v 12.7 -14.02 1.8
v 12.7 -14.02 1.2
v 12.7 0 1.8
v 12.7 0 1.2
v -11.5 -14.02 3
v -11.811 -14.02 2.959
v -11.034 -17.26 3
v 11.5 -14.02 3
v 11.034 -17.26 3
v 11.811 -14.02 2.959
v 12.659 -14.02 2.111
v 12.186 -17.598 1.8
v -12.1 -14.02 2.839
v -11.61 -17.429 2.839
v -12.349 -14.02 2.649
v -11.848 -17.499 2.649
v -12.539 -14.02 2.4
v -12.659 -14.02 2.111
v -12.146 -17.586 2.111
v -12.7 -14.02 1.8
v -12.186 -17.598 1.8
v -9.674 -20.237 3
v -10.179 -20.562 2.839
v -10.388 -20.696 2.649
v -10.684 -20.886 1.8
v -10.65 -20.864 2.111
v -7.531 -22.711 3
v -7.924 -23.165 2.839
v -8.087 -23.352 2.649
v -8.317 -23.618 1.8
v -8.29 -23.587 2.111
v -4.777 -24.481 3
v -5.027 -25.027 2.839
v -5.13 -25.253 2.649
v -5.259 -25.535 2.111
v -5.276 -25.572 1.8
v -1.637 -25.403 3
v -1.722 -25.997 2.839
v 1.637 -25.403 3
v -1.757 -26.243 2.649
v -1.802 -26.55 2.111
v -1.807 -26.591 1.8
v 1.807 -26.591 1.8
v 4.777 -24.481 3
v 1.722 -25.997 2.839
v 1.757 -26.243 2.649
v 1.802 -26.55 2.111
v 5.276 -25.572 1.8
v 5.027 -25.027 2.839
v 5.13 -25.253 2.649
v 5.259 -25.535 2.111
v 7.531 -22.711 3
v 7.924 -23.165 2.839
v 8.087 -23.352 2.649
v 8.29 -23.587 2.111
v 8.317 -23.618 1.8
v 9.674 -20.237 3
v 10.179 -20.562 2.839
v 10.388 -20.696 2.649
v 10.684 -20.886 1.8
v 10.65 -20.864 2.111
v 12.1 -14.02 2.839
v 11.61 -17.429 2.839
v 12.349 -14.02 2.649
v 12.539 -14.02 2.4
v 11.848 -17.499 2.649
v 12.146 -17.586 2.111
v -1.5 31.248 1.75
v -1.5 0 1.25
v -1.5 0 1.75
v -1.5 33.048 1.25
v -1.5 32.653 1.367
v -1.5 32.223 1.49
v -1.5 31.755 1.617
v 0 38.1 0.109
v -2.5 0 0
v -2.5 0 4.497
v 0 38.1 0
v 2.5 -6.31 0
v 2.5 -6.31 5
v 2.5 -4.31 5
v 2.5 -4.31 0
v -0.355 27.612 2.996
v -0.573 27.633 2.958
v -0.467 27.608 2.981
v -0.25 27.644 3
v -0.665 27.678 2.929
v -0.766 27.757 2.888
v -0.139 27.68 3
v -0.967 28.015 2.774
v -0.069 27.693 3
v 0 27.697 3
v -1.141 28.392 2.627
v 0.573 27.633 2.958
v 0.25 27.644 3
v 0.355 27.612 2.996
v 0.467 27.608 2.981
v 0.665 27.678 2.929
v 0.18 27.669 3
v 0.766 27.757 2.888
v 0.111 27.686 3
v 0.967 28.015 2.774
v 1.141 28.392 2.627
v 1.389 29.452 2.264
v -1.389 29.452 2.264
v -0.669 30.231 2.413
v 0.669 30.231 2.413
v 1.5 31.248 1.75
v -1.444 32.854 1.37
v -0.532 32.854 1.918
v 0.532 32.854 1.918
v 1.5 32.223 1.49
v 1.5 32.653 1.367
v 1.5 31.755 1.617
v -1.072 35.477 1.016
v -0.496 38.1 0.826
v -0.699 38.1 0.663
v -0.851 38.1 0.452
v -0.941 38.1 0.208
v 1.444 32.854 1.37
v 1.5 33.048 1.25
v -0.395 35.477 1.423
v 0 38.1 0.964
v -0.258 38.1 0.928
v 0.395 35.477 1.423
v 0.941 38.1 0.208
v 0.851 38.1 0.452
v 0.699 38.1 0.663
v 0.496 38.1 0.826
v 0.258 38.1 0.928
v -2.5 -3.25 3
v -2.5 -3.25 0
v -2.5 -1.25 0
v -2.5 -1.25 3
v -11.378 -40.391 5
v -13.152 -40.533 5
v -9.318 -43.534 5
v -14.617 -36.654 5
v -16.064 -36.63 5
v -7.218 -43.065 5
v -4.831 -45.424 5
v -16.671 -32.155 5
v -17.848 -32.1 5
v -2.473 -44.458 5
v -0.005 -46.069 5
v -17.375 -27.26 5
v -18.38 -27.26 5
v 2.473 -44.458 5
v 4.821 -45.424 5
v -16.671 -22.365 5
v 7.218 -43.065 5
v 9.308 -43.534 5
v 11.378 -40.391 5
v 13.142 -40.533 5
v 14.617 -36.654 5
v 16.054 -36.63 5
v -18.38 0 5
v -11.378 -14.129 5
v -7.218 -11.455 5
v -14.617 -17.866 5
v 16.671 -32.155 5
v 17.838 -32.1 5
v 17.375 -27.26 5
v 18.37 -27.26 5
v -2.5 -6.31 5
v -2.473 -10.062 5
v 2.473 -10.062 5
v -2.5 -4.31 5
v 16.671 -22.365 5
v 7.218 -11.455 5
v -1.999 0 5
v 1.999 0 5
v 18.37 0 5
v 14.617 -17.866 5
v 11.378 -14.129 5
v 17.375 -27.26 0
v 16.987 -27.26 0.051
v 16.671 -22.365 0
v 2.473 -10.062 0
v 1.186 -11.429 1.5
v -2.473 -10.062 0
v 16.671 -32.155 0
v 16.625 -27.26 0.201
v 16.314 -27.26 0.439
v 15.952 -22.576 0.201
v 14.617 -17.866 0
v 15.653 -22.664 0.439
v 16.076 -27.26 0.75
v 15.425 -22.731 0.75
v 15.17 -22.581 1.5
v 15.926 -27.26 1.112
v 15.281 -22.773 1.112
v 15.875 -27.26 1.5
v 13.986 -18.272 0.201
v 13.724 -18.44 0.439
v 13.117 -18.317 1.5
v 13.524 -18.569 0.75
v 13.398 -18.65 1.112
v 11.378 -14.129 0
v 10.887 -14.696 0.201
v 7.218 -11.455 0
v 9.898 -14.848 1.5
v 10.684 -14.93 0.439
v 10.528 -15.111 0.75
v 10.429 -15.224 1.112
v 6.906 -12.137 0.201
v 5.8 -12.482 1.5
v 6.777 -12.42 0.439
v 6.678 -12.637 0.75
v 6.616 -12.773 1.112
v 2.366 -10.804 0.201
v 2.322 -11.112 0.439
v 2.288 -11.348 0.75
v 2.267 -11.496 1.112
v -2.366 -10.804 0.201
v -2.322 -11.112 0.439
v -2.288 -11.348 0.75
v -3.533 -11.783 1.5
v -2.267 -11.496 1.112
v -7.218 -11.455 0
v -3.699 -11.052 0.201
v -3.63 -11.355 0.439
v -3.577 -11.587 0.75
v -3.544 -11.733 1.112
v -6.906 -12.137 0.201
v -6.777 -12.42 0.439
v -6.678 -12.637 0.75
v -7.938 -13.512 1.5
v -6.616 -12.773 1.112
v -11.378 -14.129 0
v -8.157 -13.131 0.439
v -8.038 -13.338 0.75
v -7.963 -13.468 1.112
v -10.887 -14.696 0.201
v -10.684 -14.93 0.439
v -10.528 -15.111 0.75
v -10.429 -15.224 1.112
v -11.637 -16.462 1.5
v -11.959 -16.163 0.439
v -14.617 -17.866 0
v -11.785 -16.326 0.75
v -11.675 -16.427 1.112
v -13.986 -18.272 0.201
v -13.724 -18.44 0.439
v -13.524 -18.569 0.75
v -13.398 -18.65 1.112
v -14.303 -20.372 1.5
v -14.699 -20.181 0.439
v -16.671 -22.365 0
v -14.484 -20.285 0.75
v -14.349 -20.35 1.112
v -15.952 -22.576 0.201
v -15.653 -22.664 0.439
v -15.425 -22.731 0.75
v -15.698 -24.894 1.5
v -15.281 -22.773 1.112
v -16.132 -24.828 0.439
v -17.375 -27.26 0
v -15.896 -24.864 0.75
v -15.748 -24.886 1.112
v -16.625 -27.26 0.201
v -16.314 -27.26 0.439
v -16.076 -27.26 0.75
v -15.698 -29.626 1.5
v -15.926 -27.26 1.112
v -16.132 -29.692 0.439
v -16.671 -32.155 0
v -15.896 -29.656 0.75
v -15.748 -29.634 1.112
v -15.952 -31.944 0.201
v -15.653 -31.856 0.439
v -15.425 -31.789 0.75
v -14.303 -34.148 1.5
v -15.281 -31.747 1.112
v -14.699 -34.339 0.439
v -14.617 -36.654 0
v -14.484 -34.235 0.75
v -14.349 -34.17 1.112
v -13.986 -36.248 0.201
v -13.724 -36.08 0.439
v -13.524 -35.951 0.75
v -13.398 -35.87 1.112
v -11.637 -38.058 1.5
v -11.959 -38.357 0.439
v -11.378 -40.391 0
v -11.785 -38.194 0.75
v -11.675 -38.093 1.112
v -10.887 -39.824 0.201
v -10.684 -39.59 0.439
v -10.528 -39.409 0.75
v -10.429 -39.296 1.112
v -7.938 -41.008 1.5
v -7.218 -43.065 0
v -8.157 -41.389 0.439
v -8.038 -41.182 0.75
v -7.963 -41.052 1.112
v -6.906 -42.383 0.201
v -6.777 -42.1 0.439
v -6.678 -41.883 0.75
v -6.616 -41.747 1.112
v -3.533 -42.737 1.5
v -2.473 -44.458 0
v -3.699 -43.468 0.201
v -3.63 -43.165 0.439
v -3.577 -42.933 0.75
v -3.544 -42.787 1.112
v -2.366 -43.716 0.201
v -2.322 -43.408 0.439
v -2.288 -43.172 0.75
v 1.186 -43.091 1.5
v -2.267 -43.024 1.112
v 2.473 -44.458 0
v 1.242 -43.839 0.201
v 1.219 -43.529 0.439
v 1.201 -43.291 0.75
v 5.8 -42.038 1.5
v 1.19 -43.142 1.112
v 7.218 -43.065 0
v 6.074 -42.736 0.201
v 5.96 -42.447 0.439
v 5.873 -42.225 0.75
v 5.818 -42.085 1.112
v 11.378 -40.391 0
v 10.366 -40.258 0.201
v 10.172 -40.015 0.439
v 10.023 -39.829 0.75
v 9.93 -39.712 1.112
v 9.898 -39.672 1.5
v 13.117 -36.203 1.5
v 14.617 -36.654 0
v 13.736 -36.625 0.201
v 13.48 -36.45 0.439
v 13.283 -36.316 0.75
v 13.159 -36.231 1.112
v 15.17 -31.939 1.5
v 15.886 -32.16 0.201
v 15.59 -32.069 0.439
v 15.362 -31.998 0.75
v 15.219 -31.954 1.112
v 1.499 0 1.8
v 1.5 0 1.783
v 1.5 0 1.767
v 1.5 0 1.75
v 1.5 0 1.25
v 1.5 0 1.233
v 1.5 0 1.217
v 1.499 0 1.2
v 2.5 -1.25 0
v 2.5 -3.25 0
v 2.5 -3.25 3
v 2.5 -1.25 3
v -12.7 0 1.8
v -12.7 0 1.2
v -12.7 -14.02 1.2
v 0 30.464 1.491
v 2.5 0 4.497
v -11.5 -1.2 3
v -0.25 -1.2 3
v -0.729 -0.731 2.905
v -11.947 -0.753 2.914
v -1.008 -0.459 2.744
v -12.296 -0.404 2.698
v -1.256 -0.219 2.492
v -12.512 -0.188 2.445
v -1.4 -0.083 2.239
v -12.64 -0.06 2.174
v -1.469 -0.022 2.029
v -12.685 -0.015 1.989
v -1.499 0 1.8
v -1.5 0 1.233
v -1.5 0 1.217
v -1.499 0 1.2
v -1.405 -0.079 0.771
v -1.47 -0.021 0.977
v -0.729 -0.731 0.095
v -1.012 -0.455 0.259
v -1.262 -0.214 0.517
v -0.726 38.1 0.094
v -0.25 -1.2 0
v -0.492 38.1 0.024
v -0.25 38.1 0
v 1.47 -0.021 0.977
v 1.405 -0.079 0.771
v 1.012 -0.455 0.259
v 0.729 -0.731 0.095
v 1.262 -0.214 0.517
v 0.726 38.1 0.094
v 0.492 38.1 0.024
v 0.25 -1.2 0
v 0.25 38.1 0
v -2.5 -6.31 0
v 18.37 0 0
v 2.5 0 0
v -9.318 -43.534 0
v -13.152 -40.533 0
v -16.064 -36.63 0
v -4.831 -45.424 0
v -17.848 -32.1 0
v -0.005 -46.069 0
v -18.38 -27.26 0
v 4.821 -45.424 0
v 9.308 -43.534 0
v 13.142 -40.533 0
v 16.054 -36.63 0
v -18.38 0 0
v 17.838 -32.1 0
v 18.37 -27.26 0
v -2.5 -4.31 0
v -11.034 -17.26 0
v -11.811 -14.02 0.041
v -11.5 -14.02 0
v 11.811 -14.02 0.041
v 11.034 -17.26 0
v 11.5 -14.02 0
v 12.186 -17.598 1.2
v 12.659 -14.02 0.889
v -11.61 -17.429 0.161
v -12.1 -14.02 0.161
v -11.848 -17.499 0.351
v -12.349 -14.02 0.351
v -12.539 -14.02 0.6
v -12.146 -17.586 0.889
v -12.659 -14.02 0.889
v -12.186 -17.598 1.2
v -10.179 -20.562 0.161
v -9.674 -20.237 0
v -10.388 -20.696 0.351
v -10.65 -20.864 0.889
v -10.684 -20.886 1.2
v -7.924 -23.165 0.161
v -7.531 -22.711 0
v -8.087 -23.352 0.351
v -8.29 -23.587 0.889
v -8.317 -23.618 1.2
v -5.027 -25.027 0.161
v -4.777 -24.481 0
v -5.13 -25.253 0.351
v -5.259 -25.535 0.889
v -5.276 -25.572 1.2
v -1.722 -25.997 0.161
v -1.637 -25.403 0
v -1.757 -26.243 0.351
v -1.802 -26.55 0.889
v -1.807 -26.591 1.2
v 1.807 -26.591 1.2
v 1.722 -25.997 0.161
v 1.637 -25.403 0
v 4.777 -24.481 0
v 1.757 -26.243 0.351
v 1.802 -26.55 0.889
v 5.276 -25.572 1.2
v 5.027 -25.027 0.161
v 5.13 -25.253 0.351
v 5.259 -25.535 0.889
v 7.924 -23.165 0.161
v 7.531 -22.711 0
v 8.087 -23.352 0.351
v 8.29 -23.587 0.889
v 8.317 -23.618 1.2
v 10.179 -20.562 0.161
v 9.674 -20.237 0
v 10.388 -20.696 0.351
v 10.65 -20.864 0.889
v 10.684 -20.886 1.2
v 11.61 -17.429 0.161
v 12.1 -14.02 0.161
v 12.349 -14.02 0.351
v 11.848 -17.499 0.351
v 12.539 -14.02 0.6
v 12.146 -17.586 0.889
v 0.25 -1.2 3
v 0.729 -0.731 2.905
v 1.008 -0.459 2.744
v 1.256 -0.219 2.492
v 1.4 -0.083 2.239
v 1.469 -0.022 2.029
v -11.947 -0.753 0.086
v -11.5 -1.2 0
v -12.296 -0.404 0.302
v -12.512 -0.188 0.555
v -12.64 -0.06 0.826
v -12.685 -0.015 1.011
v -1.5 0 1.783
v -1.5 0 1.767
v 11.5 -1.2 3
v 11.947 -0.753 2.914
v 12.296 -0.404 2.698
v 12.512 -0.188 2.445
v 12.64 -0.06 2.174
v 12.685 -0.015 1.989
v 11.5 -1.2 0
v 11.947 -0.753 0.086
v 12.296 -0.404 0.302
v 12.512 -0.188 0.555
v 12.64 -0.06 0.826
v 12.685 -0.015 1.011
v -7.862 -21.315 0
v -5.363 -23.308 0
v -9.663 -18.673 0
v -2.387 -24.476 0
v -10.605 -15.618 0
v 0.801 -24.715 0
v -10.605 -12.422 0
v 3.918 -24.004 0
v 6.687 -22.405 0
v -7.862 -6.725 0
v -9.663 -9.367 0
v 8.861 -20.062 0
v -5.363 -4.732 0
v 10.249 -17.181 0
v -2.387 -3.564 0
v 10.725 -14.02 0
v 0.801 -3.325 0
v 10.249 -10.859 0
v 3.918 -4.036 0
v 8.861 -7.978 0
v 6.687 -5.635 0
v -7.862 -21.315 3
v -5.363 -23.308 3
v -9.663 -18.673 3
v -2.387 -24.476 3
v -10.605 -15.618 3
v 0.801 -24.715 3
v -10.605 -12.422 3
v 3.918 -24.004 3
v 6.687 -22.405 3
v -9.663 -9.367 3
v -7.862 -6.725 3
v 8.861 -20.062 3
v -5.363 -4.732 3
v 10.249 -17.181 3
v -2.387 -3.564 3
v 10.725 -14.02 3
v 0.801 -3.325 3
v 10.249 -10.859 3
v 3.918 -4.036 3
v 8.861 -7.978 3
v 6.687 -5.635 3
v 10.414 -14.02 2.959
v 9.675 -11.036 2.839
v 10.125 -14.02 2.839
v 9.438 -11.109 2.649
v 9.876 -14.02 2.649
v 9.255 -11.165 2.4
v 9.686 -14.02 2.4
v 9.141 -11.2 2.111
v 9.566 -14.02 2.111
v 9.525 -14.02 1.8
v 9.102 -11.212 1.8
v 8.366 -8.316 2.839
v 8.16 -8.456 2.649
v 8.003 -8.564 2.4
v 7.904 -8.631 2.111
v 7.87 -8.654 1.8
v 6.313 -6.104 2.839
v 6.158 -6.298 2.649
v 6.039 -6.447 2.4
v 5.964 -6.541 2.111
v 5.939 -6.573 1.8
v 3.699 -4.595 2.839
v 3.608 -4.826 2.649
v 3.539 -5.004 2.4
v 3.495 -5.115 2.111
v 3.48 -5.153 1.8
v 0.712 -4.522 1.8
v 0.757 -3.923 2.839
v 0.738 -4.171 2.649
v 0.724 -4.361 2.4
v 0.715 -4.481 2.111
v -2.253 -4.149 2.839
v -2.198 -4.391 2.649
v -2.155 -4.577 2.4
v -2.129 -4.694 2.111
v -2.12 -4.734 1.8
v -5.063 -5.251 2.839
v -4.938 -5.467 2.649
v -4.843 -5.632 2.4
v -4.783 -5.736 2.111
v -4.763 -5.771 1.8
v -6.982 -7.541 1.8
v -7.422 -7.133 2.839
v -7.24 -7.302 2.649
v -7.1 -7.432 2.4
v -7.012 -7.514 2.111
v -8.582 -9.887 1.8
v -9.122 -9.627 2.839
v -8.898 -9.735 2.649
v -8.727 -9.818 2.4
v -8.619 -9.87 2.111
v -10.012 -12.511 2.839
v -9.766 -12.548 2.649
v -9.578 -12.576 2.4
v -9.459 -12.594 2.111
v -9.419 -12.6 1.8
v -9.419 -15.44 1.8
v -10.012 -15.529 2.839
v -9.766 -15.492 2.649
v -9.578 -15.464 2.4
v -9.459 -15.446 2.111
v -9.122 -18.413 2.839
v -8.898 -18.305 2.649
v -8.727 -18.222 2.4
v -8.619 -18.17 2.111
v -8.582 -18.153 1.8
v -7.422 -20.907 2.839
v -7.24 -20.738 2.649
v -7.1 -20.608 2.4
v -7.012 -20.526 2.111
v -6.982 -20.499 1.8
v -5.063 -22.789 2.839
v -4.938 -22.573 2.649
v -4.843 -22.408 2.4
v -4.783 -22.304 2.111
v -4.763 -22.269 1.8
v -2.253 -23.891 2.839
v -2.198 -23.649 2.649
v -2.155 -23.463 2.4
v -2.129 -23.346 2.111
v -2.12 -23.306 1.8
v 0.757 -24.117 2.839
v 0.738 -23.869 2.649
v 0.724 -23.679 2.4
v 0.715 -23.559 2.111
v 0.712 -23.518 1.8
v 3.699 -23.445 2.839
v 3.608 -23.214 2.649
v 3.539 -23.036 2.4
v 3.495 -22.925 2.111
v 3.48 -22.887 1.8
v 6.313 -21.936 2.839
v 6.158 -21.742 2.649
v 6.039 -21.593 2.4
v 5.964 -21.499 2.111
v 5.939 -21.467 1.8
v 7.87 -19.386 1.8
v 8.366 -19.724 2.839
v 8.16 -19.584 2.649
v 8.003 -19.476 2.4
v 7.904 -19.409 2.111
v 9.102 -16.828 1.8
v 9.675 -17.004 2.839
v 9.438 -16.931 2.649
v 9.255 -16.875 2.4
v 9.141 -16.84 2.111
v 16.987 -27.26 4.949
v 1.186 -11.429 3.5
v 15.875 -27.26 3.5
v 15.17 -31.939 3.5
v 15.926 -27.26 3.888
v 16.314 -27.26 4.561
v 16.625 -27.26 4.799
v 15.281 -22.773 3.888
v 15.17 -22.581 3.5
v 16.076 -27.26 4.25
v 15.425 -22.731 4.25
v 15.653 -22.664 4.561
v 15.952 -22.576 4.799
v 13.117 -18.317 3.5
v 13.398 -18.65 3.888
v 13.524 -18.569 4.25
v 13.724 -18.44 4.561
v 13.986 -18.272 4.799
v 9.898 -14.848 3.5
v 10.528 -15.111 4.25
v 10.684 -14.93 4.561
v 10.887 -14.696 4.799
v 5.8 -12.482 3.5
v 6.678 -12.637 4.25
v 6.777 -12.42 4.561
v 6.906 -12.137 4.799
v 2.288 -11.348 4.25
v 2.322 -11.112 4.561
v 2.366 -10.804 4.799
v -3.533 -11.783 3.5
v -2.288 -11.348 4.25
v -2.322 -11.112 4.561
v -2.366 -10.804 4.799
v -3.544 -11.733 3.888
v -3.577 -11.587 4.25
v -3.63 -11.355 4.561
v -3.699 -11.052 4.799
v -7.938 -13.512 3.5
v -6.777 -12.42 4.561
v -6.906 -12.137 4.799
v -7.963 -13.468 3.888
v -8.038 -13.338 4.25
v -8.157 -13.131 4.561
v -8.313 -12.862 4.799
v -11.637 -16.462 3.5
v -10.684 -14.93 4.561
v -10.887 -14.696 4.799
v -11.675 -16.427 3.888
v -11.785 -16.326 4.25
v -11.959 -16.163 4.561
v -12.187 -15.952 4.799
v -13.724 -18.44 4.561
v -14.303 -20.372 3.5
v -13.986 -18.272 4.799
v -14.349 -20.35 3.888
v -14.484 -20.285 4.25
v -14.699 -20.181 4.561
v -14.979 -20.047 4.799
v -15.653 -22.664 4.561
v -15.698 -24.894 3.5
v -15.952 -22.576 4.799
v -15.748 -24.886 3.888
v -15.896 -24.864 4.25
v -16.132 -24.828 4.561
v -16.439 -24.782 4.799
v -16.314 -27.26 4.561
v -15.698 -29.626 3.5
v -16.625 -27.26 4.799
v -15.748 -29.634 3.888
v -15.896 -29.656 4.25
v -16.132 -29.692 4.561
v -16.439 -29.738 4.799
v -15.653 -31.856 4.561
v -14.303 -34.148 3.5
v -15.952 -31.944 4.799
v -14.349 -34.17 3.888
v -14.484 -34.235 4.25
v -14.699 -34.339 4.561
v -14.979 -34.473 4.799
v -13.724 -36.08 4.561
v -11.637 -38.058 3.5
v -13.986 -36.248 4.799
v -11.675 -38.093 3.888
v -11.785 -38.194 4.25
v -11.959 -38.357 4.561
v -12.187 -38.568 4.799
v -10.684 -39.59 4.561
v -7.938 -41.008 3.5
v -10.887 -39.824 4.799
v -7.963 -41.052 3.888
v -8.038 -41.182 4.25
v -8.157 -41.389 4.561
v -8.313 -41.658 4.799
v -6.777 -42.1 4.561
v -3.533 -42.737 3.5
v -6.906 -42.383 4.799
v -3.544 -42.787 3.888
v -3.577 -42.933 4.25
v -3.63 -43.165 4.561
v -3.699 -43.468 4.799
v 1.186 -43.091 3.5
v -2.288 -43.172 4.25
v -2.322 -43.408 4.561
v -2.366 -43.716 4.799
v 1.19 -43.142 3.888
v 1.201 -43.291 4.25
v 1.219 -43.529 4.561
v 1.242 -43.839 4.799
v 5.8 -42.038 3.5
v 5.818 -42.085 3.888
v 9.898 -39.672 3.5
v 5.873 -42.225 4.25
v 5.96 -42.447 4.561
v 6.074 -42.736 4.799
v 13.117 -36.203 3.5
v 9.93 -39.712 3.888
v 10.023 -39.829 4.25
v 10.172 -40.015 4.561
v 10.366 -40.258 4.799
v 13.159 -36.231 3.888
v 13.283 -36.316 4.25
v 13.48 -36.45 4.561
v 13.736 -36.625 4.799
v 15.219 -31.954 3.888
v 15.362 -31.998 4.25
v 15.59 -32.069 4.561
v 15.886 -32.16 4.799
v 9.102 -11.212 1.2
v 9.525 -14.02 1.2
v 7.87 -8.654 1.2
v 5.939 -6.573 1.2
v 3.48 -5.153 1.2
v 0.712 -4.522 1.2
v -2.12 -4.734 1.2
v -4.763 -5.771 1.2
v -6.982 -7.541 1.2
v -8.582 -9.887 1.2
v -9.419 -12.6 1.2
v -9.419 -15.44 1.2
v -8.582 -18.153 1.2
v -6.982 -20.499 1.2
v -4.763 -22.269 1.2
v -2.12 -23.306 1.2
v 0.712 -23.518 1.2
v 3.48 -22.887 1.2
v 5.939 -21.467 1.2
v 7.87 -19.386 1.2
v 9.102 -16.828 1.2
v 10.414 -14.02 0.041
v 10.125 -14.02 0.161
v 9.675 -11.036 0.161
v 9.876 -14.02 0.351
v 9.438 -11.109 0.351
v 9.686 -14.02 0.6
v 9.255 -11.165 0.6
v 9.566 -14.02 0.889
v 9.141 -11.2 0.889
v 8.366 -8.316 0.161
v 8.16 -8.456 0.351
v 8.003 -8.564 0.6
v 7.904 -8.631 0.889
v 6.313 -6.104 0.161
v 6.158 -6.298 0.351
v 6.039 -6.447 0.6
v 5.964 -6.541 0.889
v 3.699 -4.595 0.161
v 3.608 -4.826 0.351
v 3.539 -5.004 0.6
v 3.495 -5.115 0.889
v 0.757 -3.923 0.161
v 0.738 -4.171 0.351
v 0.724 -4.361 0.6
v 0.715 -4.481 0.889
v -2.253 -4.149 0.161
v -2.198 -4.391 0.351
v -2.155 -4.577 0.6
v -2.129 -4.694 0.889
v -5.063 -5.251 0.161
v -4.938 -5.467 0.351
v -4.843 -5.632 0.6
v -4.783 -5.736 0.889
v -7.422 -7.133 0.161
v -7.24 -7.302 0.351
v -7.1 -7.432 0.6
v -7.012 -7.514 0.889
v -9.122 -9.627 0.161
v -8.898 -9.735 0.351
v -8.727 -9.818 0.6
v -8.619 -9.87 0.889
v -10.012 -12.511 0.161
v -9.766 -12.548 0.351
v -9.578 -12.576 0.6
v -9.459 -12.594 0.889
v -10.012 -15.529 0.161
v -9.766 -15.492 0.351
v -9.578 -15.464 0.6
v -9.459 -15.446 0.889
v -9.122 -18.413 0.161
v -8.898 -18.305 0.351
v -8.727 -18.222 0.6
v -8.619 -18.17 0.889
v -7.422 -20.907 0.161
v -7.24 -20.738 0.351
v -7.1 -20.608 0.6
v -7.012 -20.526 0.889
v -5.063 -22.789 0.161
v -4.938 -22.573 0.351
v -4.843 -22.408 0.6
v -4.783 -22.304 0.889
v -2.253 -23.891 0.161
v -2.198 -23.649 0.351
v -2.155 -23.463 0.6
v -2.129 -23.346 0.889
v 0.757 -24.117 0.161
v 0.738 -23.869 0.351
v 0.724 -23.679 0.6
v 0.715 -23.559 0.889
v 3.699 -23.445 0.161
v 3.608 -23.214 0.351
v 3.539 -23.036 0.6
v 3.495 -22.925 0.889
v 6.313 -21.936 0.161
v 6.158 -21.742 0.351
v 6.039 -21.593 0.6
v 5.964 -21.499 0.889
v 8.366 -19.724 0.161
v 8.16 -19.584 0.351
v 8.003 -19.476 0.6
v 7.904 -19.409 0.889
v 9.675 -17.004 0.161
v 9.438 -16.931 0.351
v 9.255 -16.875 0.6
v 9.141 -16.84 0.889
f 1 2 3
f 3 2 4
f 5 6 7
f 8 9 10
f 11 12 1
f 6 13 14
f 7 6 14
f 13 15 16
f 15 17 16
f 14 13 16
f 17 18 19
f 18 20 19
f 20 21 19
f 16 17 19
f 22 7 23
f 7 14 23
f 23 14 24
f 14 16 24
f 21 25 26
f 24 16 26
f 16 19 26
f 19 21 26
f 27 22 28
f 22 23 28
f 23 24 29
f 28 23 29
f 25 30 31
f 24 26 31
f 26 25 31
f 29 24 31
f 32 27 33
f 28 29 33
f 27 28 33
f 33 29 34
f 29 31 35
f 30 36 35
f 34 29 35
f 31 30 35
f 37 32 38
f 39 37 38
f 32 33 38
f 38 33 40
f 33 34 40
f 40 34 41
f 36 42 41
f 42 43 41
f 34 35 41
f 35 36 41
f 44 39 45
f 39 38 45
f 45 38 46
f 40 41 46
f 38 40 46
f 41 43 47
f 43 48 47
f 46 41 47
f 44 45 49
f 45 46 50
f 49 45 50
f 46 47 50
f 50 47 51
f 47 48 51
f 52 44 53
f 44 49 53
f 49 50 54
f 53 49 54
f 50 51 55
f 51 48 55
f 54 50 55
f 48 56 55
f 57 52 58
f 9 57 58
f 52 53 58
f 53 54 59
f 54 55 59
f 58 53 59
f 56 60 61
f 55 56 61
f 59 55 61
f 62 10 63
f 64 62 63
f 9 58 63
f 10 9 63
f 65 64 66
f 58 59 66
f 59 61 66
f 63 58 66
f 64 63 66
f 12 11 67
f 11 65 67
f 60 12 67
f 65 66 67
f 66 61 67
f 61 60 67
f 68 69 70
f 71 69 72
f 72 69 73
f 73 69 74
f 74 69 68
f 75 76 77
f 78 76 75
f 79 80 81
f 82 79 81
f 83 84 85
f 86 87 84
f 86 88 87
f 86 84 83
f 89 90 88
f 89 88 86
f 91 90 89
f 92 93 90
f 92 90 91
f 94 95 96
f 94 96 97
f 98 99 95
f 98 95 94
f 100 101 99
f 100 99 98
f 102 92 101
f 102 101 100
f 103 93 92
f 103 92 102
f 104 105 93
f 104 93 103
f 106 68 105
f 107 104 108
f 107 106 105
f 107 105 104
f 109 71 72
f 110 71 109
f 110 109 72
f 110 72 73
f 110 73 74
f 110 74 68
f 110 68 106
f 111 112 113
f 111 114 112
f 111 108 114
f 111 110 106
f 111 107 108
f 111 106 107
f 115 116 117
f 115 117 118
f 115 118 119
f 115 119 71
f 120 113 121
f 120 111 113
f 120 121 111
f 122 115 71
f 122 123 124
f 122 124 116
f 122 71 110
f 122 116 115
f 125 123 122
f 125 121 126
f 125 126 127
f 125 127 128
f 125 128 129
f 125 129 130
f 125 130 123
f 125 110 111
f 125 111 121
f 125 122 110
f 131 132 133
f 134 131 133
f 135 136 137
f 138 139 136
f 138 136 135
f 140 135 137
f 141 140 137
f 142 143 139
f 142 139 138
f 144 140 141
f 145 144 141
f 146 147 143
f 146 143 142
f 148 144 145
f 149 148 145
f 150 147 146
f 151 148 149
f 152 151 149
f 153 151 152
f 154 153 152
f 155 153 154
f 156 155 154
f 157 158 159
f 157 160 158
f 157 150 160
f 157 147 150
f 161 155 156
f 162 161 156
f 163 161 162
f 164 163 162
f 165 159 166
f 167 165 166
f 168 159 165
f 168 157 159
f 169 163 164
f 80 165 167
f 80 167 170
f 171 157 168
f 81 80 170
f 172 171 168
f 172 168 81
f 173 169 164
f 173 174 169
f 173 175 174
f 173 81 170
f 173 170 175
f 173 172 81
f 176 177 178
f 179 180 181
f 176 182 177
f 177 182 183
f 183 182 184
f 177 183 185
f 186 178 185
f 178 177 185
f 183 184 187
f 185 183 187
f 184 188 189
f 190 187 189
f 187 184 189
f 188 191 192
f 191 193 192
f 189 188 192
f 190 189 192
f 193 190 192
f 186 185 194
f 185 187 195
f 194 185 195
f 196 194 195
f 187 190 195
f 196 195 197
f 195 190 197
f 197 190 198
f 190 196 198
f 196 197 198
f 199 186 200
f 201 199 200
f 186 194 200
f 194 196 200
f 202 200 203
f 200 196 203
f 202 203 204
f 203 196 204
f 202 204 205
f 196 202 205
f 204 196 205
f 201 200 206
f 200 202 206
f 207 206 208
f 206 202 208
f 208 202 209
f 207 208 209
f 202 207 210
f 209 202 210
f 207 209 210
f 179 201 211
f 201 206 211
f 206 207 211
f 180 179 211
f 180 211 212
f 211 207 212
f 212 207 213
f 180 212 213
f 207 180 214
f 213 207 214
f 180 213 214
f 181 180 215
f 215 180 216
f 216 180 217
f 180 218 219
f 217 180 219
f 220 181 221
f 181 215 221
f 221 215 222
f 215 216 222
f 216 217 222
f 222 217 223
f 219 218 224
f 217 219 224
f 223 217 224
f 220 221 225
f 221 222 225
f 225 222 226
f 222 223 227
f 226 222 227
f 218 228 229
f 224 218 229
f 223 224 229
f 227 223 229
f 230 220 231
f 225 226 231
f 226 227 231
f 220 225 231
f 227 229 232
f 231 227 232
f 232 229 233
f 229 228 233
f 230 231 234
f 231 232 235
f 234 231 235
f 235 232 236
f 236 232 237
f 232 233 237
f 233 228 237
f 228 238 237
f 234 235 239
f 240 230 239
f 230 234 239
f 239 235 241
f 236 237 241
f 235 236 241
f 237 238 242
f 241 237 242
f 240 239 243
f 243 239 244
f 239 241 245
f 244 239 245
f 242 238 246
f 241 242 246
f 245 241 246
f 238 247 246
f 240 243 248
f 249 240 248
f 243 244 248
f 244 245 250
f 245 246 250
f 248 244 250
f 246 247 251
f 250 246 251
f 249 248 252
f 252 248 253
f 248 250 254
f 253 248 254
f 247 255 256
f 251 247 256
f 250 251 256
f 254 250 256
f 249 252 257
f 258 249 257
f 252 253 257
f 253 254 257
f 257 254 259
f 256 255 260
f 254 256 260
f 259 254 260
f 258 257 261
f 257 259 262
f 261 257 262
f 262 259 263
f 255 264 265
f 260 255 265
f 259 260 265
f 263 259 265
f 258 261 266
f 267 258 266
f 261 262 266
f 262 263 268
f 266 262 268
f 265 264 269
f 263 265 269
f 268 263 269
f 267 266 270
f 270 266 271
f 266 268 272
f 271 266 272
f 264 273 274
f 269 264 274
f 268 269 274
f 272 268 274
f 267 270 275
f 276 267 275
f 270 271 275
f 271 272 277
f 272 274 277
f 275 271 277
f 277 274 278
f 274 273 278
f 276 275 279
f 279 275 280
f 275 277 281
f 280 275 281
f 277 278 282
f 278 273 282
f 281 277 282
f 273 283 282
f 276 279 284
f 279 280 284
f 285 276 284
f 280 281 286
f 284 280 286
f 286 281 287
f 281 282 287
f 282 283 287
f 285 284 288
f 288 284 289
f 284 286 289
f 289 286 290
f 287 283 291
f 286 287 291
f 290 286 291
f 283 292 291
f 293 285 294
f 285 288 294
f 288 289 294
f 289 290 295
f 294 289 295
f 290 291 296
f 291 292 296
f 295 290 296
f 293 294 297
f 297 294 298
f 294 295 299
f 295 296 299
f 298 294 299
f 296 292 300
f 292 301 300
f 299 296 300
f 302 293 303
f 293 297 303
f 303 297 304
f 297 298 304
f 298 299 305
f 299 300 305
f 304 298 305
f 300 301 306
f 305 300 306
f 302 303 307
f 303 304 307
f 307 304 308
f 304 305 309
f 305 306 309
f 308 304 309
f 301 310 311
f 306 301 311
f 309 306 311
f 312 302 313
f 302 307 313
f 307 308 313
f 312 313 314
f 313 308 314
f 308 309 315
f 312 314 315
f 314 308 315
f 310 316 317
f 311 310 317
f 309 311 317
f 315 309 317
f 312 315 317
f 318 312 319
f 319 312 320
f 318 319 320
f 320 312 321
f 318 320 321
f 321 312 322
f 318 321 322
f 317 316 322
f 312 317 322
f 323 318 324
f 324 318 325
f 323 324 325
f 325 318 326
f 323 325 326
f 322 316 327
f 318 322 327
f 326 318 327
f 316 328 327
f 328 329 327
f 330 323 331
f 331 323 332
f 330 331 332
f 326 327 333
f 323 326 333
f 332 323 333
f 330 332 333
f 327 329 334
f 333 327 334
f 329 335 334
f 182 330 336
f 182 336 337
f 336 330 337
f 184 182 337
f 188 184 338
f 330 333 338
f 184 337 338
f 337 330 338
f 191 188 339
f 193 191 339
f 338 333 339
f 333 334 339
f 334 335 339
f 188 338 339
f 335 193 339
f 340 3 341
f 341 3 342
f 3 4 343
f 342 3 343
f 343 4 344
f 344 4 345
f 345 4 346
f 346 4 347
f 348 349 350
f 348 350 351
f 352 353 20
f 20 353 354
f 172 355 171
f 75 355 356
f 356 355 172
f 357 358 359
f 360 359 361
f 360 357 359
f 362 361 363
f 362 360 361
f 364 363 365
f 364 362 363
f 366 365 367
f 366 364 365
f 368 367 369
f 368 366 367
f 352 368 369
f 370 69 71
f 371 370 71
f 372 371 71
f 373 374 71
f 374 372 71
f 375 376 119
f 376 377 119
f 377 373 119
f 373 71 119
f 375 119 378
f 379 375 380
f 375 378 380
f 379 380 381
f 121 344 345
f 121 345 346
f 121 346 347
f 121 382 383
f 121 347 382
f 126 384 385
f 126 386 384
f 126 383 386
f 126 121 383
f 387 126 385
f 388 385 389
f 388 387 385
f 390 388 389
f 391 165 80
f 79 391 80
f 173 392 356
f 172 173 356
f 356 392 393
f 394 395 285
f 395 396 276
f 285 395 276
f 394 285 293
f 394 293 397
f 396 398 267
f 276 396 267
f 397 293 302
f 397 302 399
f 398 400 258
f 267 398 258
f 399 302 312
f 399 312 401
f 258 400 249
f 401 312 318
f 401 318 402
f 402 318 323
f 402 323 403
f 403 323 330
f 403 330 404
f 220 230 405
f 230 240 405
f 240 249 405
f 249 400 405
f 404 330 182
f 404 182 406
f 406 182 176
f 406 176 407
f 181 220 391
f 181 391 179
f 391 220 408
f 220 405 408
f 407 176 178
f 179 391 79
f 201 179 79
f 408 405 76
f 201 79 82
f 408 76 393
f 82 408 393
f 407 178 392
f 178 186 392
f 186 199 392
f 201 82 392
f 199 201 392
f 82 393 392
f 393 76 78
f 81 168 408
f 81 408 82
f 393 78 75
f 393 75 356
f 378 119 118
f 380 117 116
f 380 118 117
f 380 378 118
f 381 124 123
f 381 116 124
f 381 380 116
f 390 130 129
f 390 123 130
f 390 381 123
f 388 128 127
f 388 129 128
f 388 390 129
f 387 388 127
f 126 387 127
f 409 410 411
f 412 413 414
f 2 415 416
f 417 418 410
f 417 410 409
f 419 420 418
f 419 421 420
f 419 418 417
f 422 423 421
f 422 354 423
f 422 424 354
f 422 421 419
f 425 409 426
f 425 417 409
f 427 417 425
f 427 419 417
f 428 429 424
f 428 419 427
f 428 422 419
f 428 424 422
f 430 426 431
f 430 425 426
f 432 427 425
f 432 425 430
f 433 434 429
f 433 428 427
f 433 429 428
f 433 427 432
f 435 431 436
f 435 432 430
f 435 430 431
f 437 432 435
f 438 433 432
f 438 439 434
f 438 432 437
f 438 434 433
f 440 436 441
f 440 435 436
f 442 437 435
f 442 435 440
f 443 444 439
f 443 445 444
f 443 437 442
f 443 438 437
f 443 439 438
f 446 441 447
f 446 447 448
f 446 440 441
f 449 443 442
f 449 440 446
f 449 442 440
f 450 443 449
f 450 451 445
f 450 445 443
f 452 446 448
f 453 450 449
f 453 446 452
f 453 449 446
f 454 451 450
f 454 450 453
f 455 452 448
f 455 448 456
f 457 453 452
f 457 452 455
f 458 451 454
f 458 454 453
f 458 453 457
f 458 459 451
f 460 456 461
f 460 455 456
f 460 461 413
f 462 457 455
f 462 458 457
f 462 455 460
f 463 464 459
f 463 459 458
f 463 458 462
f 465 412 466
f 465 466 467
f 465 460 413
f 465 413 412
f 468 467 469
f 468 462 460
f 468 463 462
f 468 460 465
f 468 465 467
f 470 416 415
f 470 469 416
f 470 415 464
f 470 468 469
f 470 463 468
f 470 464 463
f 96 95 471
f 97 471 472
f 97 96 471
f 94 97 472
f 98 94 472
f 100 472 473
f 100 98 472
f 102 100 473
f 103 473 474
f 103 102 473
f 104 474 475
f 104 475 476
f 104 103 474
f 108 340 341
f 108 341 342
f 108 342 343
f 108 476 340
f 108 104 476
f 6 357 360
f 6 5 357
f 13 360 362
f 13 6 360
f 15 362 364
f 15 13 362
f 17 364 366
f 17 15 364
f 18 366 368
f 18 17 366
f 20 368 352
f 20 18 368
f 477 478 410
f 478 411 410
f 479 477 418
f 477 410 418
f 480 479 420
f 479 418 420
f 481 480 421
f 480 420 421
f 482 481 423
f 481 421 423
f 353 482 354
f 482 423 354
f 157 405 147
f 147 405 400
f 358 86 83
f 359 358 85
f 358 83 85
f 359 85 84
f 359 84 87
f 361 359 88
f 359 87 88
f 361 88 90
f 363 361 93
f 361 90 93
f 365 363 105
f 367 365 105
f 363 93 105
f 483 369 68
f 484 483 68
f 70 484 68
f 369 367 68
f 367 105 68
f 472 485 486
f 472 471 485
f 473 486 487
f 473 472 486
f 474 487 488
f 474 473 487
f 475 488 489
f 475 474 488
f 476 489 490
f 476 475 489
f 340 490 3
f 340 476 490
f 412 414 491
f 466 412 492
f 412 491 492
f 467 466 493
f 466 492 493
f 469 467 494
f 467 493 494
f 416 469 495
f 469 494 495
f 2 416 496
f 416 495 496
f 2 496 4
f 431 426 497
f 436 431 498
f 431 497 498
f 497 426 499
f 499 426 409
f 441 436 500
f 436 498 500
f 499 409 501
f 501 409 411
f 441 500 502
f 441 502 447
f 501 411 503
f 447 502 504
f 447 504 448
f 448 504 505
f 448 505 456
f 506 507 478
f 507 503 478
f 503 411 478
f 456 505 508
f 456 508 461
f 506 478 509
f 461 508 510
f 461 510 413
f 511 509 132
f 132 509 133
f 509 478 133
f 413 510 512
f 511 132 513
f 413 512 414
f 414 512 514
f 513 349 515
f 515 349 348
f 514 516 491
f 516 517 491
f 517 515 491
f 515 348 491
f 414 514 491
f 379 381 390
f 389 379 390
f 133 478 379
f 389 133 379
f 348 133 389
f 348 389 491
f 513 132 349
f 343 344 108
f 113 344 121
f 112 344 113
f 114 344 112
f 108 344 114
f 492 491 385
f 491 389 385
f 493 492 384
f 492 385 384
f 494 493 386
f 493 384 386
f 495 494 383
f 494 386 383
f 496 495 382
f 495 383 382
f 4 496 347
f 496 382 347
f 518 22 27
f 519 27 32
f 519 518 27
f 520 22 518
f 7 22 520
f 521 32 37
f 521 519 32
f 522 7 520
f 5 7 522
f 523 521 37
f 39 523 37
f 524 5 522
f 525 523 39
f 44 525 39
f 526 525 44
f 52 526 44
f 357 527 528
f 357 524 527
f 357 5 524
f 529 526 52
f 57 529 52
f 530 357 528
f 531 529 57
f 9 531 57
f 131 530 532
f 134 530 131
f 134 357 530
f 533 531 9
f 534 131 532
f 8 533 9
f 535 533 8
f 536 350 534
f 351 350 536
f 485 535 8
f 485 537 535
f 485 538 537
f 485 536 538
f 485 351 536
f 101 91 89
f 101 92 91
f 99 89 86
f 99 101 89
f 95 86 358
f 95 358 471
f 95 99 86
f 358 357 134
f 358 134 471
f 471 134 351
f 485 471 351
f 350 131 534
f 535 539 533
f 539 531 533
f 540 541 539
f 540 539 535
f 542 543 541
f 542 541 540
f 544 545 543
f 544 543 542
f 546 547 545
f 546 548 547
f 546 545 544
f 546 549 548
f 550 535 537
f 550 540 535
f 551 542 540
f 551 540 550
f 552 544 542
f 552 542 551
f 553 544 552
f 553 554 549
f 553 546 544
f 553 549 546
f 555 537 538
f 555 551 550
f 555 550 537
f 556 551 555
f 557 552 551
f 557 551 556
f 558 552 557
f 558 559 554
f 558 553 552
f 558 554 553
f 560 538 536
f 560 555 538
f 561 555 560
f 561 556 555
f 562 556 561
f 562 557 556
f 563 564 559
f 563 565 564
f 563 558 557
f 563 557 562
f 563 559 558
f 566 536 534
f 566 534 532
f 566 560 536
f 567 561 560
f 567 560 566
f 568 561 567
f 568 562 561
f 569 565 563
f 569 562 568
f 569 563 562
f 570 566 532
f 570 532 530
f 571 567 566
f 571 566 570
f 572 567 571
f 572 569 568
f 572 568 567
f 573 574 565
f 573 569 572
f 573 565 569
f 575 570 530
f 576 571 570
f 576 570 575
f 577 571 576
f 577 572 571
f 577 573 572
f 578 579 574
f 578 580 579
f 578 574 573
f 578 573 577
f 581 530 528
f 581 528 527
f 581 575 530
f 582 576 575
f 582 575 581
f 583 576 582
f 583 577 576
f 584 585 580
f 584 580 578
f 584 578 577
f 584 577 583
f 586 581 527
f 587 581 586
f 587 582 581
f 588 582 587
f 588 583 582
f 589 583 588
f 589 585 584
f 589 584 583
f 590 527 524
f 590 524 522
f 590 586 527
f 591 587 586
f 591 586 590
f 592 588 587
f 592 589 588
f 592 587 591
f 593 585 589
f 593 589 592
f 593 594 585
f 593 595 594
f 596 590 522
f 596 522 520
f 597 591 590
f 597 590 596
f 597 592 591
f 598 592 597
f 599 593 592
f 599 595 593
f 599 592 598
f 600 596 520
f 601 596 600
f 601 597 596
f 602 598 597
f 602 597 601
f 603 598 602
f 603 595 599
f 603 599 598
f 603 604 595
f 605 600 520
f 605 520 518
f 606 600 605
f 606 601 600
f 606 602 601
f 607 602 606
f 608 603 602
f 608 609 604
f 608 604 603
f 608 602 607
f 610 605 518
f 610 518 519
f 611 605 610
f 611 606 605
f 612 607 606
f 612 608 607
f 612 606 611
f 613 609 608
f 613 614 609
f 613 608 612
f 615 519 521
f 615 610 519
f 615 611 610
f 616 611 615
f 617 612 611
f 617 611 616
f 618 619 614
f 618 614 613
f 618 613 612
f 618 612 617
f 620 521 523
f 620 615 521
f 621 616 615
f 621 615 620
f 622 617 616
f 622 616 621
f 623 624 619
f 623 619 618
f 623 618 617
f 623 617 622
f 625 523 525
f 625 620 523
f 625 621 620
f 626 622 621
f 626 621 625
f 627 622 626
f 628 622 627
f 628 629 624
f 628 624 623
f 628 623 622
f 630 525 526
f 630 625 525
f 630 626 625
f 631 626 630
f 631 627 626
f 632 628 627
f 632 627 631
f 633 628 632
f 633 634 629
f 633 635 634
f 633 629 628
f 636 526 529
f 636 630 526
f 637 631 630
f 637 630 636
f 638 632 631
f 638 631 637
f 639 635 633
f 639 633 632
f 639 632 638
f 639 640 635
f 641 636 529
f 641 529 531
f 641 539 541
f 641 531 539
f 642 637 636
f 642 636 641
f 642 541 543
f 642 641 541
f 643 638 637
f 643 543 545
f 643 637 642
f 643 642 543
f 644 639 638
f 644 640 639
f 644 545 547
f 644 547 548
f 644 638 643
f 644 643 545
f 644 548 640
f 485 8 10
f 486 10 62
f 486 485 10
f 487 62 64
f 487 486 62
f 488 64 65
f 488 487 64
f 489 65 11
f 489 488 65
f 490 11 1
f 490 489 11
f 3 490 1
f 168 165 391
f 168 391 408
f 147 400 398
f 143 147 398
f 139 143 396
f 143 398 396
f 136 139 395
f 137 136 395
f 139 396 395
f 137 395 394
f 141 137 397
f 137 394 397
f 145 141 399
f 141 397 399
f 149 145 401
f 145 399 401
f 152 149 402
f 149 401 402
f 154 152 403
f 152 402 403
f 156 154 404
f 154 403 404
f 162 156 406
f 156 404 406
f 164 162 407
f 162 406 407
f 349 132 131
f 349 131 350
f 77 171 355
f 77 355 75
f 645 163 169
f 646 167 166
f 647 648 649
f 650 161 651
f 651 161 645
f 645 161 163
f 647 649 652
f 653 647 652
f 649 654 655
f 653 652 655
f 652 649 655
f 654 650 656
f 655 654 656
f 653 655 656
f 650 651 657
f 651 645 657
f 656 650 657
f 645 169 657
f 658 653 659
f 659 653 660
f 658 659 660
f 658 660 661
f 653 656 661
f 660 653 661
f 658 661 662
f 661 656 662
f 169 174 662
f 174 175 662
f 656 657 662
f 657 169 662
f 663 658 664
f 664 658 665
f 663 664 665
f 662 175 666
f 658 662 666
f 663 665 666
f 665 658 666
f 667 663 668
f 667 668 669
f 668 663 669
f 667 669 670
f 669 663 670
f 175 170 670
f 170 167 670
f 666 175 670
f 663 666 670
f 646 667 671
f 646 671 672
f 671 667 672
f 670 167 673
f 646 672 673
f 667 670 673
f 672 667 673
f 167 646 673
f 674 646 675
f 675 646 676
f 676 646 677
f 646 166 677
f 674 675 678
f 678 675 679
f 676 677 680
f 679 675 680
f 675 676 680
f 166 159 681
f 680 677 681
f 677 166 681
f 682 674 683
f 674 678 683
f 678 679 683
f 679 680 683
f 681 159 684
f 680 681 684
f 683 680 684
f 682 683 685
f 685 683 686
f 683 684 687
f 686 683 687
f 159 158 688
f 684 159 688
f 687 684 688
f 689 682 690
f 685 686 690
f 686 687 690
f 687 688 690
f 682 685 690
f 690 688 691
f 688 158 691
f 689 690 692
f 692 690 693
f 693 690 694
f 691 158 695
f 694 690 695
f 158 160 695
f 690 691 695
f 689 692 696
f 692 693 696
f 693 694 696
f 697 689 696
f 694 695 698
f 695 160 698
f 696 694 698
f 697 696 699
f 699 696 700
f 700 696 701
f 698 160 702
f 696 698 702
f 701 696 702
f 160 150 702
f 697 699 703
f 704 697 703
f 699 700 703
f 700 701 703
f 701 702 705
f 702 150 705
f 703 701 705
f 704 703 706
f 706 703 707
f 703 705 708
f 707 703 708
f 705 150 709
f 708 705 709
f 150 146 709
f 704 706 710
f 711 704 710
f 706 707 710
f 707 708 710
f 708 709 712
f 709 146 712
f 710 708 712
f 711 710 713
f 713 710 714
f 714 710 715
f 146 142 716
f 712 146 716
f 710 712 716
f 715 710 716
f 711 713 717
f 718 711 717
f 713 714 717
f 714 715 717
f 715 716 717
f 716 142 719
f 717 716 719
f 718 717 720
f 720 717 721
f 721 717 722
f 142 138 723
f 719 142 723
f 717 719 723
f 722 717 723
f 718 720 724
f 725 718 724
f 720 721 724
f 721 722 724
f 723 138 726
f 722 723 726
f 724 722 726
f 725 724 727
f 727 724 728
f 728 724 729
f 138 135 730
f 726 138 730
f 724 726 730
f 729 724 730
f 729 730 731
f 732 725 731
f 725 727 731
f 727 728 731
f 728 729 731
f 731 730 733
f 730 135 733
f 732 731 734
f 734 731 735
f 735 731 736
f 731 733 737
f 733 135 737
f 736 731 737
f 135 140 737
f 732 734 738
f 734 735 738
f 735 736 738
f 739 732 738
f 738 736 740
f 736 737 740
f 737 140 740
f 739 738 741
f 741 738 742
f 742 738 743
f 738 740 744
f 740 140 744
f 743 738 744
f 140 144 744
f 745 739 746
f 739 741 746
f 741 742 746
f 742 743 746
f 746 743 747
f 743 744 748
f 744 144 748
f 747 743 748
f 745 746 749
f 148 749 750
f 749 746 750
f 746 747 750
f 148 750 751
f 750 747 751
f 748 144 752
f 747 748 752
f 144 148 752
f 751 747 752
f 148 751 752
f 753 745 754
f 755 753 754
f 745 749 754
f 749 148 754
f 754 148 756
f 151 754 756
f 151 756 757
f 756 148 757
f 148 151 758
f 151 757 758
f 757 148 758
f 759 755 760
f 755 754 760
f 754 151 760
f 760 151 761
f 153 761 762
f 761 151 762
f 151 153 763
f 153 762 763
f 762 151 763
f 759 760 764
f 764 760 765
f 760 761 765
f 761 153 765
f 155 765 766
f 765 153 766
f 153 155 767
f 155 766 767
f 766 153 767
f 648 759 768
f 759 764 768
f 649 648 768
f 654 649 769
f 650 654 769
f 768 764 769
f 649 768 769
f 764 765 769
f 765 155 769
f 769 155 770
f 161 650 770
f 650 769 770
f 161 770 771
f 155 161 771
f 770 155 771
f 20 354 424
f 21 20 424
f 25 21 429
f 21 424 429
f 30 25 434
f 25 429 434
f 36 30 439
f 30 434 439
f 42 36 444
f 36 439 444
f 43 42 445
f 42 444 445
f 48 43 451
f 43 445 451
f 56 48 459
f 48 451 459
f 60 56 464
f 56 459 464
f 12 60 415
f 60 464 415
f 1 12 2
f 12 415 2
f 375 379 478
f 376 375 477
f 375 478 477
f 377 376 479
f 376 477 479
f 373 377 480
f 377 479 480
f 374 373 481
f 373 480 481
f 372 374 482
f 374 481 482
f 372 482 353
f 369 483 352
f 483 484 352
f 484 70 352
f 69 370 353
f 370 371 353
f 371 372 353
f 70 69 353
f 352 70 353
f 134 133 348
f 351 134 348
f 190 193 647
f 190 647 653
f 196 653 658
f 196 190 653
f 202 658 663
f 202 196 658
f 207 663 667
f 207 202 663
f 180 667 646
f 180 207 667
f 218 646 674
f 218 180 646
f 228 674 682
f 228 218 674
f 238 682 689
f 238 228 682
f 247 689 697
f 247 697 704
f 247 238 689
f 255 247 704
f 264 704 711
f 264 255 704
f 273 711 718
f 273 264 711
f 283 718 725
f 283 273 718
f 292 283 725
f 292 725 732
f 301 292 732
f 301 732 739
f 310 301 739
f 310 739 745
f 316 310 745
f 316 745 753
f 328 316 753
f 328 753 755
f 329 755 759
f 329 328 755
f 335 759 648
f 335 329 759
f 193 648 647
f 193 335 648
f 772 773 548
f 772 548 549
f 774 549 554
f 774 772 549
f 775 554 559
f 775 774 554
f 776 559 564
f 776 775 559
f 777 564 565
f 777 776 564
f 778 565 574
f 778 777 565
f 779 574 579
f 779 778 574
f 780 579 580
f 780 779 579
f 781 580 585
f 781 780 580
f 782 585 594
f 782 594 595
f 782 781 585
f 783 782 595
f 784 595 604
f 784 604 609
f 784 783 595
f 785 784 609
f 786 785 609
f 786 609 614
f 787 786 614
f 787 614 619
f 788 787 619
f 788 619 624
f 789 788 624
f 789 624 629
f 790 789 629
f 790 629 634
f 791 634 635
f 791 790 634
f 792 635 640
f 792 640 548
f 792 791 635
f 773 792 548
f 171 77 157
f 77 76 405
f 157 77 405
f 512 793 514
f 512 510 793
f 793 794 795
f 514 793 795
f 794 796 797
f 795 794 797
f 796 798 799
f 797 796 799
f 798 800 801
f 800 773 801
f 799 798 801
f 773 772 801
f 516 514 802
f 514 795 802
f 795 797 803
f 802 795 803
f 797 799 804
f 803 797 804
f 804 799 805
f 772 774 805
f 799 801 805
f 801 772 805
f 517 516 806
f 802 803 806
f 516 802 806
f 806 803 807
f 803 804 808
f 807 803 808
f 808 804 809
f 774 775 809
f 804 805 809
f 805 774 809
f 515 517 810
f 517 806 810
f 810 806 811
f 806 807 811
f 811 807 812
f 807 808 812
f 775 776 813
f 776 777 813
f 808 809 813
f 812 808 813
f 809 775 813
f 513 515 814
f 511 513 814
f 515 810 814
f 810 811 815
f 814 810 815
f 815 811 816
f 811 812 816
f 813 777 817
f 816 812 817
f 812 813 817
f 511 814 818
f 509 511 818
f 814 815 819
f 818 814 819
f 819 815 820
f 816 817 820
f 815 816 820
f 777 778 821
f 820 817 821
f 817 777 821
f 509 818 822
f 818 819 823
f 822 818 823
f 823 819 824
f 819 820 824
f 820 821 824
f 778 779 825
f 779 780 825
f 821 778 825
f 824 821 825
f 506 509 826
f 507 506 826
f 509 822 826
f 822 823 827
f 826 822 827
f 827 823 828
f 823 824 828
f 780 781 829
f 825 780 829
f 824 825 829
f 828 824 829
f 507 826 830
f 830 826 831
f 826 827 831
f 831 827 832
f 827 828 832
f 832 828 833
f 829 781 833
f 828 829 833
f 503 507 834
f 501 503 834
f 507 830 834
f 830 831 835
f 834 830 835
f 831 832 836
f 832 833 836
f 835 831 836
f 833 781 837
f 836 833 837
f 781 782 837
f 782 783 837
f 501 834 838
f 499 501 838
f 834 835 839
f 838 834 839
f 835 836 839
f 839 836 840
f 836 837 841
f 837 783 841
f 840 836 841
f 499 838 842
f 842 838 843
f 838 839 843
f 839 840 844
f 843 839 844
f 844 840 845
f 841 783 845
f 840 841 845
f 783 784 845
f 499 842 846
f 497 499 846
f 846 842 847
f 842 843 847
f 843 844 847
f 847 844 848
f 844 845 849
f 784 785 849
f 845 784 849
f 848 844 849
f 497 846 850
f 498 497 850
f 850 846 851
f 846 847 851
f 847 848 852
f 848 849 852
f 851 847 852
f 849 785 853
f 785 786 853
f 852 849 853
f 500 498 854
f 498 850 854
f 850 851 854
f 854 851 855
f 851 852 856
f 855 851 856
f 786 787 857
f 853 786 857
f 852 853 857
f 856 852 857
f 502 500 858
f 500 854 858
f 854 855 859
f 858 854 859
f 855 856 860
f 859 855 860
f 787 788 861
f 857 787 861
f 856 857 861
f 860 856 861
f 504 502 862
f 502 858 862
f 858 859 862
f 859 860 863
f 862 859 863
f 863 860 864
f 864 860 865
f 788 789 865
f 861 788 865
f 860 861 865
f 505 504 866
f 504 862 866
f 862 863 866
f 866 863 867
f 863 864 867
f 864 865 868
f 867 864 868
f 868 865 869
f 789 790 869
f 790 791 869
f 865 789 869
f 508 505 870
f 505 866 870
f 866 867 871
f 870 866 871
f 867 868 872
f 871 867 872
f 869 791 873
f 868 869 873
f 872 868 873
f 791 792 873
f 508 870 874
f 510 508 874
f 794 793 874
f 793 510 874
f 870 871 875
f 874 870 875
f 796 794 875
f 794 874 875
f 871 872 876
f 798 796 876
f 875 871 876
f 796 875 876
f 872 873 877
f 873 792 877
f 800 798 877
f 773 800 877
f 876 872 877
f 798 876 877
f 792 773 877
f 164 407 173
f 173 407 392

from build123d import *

# Parameters (mm, degrees)
SKETCH_R        = 15.875
PAD_DEPTH       = 5
SKETCH001_W     = 5
SKETCH001_H     = 2
POCKET_DEPTH    = 5.001
POCKET001_DEPTH = 36.756
CHAMFER_SIZE    = 0.5
FILLET_R        = 1.5
SKETCH003_R     = 9.525
SKETCH003_W     = 5
SKETCH003_H     = 2
SKETCH003_W_2   = 3
SKETCH003_H_2   = 38.1
PAD001_DEPTH    = 3
FILLET001_R     = 1.25
FILLET002_R     = 1.2


with BuildPart() as mountbody:
    # Sketch → Pad (new body)
    with BuildSketch(Plane.XY):
        with BuildLine():
            Line((-18.38, 0), (-18.38, -8))
            Line((-18.38, -8), (-18.38, -27.26))
            ThreePointArc((-18.38, -27.26), (-0.005, -46.06869), (18.37, -27.26))
            Line((18.37, -27.26), (18.37, -8))
            Line((18.37, -8), (18.37, 0))
            Line((18.37, 0), (2.5, 0))
            Line((0, 38.1), (2.5, 0))
            Line((-2.5, 0), (0, 38.1))
            Line((-2.5, 0), (-18.38, 0))
        make_face()
        with Locations((0, -27.26)):
            Circle(SKETCH_R, mode=Mode.SUBTRACT)
    extrude(amount=PAD_DEPTH)

    # Sketch001 (on Face8 of Pad) → Pocket (cut, through all)
    with BuildSketch(Plane.XY.offset(5)):
        with Locations((0, -5.31)):
            Rectangle(SKETCH001_W, SKETCH001_H)
    extrude(amount=-POCKET_DEPTH, mode=Mode.SUBTRACT)

    # Sketch002 (on Face9 of Pocket) → Pocket001 (cut, through all)
    with BuildSketch(Plane.YZ.offset(18.37)):
        Polygon((43.413498, 0), (0, 5), (43.663979, 7.023387), align=None)
    extrude(amount=-POCKET001_DEPTH, mode=Mode.SUBTRACT)

    # Chamfer
    chamfer_edges = [mountbody.edges().sort_by_distance(p)[0] for p in [
        (-1.25, 19.05, 2.805982),
        (1.25, 19.05, 2.805982),
    ]]
    chamfer(chamfer_edges, length=CHAMFER_SIZE)

    # Fillet
    fillet_edges = [mountbody.edges().sort_by_distance(p)[0] for p in [
        (-15.875, -27.26, 5),
        (-15.875, -27.26, 0),
    ]]
    fillet(fillet_edges, radius=FILLET_R)


with BuildPart() as mountbody001:
    # Sketch003 → Pad001 (new body)
    with BuildSketch(Plane.XY):
        with BuildLine():
            Line((-12.7, 0), (-12.7, -14.02))
            ThreePointArc((-12.7, -14.02), (0, -26.72), (12.7, -14.02))
            Line((12.7, -14.02), (12.7, 0))
            Line((12.7, 0), (-12.7, 0))
        make_face()
        with Locations((0, -14.02)):
            Circle(SKETCH003_R, mode=Mode.SUBTRACT)
        with Locations((0, -2.25)):
            Rectangle(SKETCH003_W, SKETCH003_H, mode=Mode.SUBTRACT)
        with Locations((0, 19.05)):
            Rectangle(SKETCH003_W_2, SKETCH003_H_2)
    extrude(amount=PAD001_DEPTH)

    # Sketch004 → Groove (revolve, cut)
    with BuildSketch(Plane.YZ):
        Polygon((11.575809, 6.155771), (40.717484, 0.451151), (38.905262, 6.358538), align=None)
    revolve(axis=Axis((0, 0, 0), (0, 1, 0)), mode=Mode.SUBTRACT)

    # Fillet001
    fillet001_edges = [mountbody001.edges().sort_by_distance(p)[0] for p in [
        (1.5, 12.943975, 3),
        (-1.5, 12.943975, 3),
        (1.5, 17.679754, 0),
        (-1.5, 17.679754, 0),
    ]]
    fillet(fillet001_edges, radius=FILLET001_R)

    # Fillet002
    fillet002_edges = [mountbody001.edges().sort_by_distance(p)[0] for p in [
        (-9.525, -14.02, 3),
        (-9.525, -14.02, 0),
        (0, -26.72, 3),
        (12.7, -7.01, 3),
        (12.7, -7.01, 0),
        (0, -26.72, 0),
        (7.1, 0, 3),
        (-7.1, 0, 3),
        (-12.7, -7.01, 3),
        (7.1, 0, 0),
        (-7.1, 0, 0),
        (-12.7, -7.01, 0),
    ]]
    fillet(fillet002_edges, radius=FILLET002_R)


solid = Compound([mountbody.part, mountbody001.part])
